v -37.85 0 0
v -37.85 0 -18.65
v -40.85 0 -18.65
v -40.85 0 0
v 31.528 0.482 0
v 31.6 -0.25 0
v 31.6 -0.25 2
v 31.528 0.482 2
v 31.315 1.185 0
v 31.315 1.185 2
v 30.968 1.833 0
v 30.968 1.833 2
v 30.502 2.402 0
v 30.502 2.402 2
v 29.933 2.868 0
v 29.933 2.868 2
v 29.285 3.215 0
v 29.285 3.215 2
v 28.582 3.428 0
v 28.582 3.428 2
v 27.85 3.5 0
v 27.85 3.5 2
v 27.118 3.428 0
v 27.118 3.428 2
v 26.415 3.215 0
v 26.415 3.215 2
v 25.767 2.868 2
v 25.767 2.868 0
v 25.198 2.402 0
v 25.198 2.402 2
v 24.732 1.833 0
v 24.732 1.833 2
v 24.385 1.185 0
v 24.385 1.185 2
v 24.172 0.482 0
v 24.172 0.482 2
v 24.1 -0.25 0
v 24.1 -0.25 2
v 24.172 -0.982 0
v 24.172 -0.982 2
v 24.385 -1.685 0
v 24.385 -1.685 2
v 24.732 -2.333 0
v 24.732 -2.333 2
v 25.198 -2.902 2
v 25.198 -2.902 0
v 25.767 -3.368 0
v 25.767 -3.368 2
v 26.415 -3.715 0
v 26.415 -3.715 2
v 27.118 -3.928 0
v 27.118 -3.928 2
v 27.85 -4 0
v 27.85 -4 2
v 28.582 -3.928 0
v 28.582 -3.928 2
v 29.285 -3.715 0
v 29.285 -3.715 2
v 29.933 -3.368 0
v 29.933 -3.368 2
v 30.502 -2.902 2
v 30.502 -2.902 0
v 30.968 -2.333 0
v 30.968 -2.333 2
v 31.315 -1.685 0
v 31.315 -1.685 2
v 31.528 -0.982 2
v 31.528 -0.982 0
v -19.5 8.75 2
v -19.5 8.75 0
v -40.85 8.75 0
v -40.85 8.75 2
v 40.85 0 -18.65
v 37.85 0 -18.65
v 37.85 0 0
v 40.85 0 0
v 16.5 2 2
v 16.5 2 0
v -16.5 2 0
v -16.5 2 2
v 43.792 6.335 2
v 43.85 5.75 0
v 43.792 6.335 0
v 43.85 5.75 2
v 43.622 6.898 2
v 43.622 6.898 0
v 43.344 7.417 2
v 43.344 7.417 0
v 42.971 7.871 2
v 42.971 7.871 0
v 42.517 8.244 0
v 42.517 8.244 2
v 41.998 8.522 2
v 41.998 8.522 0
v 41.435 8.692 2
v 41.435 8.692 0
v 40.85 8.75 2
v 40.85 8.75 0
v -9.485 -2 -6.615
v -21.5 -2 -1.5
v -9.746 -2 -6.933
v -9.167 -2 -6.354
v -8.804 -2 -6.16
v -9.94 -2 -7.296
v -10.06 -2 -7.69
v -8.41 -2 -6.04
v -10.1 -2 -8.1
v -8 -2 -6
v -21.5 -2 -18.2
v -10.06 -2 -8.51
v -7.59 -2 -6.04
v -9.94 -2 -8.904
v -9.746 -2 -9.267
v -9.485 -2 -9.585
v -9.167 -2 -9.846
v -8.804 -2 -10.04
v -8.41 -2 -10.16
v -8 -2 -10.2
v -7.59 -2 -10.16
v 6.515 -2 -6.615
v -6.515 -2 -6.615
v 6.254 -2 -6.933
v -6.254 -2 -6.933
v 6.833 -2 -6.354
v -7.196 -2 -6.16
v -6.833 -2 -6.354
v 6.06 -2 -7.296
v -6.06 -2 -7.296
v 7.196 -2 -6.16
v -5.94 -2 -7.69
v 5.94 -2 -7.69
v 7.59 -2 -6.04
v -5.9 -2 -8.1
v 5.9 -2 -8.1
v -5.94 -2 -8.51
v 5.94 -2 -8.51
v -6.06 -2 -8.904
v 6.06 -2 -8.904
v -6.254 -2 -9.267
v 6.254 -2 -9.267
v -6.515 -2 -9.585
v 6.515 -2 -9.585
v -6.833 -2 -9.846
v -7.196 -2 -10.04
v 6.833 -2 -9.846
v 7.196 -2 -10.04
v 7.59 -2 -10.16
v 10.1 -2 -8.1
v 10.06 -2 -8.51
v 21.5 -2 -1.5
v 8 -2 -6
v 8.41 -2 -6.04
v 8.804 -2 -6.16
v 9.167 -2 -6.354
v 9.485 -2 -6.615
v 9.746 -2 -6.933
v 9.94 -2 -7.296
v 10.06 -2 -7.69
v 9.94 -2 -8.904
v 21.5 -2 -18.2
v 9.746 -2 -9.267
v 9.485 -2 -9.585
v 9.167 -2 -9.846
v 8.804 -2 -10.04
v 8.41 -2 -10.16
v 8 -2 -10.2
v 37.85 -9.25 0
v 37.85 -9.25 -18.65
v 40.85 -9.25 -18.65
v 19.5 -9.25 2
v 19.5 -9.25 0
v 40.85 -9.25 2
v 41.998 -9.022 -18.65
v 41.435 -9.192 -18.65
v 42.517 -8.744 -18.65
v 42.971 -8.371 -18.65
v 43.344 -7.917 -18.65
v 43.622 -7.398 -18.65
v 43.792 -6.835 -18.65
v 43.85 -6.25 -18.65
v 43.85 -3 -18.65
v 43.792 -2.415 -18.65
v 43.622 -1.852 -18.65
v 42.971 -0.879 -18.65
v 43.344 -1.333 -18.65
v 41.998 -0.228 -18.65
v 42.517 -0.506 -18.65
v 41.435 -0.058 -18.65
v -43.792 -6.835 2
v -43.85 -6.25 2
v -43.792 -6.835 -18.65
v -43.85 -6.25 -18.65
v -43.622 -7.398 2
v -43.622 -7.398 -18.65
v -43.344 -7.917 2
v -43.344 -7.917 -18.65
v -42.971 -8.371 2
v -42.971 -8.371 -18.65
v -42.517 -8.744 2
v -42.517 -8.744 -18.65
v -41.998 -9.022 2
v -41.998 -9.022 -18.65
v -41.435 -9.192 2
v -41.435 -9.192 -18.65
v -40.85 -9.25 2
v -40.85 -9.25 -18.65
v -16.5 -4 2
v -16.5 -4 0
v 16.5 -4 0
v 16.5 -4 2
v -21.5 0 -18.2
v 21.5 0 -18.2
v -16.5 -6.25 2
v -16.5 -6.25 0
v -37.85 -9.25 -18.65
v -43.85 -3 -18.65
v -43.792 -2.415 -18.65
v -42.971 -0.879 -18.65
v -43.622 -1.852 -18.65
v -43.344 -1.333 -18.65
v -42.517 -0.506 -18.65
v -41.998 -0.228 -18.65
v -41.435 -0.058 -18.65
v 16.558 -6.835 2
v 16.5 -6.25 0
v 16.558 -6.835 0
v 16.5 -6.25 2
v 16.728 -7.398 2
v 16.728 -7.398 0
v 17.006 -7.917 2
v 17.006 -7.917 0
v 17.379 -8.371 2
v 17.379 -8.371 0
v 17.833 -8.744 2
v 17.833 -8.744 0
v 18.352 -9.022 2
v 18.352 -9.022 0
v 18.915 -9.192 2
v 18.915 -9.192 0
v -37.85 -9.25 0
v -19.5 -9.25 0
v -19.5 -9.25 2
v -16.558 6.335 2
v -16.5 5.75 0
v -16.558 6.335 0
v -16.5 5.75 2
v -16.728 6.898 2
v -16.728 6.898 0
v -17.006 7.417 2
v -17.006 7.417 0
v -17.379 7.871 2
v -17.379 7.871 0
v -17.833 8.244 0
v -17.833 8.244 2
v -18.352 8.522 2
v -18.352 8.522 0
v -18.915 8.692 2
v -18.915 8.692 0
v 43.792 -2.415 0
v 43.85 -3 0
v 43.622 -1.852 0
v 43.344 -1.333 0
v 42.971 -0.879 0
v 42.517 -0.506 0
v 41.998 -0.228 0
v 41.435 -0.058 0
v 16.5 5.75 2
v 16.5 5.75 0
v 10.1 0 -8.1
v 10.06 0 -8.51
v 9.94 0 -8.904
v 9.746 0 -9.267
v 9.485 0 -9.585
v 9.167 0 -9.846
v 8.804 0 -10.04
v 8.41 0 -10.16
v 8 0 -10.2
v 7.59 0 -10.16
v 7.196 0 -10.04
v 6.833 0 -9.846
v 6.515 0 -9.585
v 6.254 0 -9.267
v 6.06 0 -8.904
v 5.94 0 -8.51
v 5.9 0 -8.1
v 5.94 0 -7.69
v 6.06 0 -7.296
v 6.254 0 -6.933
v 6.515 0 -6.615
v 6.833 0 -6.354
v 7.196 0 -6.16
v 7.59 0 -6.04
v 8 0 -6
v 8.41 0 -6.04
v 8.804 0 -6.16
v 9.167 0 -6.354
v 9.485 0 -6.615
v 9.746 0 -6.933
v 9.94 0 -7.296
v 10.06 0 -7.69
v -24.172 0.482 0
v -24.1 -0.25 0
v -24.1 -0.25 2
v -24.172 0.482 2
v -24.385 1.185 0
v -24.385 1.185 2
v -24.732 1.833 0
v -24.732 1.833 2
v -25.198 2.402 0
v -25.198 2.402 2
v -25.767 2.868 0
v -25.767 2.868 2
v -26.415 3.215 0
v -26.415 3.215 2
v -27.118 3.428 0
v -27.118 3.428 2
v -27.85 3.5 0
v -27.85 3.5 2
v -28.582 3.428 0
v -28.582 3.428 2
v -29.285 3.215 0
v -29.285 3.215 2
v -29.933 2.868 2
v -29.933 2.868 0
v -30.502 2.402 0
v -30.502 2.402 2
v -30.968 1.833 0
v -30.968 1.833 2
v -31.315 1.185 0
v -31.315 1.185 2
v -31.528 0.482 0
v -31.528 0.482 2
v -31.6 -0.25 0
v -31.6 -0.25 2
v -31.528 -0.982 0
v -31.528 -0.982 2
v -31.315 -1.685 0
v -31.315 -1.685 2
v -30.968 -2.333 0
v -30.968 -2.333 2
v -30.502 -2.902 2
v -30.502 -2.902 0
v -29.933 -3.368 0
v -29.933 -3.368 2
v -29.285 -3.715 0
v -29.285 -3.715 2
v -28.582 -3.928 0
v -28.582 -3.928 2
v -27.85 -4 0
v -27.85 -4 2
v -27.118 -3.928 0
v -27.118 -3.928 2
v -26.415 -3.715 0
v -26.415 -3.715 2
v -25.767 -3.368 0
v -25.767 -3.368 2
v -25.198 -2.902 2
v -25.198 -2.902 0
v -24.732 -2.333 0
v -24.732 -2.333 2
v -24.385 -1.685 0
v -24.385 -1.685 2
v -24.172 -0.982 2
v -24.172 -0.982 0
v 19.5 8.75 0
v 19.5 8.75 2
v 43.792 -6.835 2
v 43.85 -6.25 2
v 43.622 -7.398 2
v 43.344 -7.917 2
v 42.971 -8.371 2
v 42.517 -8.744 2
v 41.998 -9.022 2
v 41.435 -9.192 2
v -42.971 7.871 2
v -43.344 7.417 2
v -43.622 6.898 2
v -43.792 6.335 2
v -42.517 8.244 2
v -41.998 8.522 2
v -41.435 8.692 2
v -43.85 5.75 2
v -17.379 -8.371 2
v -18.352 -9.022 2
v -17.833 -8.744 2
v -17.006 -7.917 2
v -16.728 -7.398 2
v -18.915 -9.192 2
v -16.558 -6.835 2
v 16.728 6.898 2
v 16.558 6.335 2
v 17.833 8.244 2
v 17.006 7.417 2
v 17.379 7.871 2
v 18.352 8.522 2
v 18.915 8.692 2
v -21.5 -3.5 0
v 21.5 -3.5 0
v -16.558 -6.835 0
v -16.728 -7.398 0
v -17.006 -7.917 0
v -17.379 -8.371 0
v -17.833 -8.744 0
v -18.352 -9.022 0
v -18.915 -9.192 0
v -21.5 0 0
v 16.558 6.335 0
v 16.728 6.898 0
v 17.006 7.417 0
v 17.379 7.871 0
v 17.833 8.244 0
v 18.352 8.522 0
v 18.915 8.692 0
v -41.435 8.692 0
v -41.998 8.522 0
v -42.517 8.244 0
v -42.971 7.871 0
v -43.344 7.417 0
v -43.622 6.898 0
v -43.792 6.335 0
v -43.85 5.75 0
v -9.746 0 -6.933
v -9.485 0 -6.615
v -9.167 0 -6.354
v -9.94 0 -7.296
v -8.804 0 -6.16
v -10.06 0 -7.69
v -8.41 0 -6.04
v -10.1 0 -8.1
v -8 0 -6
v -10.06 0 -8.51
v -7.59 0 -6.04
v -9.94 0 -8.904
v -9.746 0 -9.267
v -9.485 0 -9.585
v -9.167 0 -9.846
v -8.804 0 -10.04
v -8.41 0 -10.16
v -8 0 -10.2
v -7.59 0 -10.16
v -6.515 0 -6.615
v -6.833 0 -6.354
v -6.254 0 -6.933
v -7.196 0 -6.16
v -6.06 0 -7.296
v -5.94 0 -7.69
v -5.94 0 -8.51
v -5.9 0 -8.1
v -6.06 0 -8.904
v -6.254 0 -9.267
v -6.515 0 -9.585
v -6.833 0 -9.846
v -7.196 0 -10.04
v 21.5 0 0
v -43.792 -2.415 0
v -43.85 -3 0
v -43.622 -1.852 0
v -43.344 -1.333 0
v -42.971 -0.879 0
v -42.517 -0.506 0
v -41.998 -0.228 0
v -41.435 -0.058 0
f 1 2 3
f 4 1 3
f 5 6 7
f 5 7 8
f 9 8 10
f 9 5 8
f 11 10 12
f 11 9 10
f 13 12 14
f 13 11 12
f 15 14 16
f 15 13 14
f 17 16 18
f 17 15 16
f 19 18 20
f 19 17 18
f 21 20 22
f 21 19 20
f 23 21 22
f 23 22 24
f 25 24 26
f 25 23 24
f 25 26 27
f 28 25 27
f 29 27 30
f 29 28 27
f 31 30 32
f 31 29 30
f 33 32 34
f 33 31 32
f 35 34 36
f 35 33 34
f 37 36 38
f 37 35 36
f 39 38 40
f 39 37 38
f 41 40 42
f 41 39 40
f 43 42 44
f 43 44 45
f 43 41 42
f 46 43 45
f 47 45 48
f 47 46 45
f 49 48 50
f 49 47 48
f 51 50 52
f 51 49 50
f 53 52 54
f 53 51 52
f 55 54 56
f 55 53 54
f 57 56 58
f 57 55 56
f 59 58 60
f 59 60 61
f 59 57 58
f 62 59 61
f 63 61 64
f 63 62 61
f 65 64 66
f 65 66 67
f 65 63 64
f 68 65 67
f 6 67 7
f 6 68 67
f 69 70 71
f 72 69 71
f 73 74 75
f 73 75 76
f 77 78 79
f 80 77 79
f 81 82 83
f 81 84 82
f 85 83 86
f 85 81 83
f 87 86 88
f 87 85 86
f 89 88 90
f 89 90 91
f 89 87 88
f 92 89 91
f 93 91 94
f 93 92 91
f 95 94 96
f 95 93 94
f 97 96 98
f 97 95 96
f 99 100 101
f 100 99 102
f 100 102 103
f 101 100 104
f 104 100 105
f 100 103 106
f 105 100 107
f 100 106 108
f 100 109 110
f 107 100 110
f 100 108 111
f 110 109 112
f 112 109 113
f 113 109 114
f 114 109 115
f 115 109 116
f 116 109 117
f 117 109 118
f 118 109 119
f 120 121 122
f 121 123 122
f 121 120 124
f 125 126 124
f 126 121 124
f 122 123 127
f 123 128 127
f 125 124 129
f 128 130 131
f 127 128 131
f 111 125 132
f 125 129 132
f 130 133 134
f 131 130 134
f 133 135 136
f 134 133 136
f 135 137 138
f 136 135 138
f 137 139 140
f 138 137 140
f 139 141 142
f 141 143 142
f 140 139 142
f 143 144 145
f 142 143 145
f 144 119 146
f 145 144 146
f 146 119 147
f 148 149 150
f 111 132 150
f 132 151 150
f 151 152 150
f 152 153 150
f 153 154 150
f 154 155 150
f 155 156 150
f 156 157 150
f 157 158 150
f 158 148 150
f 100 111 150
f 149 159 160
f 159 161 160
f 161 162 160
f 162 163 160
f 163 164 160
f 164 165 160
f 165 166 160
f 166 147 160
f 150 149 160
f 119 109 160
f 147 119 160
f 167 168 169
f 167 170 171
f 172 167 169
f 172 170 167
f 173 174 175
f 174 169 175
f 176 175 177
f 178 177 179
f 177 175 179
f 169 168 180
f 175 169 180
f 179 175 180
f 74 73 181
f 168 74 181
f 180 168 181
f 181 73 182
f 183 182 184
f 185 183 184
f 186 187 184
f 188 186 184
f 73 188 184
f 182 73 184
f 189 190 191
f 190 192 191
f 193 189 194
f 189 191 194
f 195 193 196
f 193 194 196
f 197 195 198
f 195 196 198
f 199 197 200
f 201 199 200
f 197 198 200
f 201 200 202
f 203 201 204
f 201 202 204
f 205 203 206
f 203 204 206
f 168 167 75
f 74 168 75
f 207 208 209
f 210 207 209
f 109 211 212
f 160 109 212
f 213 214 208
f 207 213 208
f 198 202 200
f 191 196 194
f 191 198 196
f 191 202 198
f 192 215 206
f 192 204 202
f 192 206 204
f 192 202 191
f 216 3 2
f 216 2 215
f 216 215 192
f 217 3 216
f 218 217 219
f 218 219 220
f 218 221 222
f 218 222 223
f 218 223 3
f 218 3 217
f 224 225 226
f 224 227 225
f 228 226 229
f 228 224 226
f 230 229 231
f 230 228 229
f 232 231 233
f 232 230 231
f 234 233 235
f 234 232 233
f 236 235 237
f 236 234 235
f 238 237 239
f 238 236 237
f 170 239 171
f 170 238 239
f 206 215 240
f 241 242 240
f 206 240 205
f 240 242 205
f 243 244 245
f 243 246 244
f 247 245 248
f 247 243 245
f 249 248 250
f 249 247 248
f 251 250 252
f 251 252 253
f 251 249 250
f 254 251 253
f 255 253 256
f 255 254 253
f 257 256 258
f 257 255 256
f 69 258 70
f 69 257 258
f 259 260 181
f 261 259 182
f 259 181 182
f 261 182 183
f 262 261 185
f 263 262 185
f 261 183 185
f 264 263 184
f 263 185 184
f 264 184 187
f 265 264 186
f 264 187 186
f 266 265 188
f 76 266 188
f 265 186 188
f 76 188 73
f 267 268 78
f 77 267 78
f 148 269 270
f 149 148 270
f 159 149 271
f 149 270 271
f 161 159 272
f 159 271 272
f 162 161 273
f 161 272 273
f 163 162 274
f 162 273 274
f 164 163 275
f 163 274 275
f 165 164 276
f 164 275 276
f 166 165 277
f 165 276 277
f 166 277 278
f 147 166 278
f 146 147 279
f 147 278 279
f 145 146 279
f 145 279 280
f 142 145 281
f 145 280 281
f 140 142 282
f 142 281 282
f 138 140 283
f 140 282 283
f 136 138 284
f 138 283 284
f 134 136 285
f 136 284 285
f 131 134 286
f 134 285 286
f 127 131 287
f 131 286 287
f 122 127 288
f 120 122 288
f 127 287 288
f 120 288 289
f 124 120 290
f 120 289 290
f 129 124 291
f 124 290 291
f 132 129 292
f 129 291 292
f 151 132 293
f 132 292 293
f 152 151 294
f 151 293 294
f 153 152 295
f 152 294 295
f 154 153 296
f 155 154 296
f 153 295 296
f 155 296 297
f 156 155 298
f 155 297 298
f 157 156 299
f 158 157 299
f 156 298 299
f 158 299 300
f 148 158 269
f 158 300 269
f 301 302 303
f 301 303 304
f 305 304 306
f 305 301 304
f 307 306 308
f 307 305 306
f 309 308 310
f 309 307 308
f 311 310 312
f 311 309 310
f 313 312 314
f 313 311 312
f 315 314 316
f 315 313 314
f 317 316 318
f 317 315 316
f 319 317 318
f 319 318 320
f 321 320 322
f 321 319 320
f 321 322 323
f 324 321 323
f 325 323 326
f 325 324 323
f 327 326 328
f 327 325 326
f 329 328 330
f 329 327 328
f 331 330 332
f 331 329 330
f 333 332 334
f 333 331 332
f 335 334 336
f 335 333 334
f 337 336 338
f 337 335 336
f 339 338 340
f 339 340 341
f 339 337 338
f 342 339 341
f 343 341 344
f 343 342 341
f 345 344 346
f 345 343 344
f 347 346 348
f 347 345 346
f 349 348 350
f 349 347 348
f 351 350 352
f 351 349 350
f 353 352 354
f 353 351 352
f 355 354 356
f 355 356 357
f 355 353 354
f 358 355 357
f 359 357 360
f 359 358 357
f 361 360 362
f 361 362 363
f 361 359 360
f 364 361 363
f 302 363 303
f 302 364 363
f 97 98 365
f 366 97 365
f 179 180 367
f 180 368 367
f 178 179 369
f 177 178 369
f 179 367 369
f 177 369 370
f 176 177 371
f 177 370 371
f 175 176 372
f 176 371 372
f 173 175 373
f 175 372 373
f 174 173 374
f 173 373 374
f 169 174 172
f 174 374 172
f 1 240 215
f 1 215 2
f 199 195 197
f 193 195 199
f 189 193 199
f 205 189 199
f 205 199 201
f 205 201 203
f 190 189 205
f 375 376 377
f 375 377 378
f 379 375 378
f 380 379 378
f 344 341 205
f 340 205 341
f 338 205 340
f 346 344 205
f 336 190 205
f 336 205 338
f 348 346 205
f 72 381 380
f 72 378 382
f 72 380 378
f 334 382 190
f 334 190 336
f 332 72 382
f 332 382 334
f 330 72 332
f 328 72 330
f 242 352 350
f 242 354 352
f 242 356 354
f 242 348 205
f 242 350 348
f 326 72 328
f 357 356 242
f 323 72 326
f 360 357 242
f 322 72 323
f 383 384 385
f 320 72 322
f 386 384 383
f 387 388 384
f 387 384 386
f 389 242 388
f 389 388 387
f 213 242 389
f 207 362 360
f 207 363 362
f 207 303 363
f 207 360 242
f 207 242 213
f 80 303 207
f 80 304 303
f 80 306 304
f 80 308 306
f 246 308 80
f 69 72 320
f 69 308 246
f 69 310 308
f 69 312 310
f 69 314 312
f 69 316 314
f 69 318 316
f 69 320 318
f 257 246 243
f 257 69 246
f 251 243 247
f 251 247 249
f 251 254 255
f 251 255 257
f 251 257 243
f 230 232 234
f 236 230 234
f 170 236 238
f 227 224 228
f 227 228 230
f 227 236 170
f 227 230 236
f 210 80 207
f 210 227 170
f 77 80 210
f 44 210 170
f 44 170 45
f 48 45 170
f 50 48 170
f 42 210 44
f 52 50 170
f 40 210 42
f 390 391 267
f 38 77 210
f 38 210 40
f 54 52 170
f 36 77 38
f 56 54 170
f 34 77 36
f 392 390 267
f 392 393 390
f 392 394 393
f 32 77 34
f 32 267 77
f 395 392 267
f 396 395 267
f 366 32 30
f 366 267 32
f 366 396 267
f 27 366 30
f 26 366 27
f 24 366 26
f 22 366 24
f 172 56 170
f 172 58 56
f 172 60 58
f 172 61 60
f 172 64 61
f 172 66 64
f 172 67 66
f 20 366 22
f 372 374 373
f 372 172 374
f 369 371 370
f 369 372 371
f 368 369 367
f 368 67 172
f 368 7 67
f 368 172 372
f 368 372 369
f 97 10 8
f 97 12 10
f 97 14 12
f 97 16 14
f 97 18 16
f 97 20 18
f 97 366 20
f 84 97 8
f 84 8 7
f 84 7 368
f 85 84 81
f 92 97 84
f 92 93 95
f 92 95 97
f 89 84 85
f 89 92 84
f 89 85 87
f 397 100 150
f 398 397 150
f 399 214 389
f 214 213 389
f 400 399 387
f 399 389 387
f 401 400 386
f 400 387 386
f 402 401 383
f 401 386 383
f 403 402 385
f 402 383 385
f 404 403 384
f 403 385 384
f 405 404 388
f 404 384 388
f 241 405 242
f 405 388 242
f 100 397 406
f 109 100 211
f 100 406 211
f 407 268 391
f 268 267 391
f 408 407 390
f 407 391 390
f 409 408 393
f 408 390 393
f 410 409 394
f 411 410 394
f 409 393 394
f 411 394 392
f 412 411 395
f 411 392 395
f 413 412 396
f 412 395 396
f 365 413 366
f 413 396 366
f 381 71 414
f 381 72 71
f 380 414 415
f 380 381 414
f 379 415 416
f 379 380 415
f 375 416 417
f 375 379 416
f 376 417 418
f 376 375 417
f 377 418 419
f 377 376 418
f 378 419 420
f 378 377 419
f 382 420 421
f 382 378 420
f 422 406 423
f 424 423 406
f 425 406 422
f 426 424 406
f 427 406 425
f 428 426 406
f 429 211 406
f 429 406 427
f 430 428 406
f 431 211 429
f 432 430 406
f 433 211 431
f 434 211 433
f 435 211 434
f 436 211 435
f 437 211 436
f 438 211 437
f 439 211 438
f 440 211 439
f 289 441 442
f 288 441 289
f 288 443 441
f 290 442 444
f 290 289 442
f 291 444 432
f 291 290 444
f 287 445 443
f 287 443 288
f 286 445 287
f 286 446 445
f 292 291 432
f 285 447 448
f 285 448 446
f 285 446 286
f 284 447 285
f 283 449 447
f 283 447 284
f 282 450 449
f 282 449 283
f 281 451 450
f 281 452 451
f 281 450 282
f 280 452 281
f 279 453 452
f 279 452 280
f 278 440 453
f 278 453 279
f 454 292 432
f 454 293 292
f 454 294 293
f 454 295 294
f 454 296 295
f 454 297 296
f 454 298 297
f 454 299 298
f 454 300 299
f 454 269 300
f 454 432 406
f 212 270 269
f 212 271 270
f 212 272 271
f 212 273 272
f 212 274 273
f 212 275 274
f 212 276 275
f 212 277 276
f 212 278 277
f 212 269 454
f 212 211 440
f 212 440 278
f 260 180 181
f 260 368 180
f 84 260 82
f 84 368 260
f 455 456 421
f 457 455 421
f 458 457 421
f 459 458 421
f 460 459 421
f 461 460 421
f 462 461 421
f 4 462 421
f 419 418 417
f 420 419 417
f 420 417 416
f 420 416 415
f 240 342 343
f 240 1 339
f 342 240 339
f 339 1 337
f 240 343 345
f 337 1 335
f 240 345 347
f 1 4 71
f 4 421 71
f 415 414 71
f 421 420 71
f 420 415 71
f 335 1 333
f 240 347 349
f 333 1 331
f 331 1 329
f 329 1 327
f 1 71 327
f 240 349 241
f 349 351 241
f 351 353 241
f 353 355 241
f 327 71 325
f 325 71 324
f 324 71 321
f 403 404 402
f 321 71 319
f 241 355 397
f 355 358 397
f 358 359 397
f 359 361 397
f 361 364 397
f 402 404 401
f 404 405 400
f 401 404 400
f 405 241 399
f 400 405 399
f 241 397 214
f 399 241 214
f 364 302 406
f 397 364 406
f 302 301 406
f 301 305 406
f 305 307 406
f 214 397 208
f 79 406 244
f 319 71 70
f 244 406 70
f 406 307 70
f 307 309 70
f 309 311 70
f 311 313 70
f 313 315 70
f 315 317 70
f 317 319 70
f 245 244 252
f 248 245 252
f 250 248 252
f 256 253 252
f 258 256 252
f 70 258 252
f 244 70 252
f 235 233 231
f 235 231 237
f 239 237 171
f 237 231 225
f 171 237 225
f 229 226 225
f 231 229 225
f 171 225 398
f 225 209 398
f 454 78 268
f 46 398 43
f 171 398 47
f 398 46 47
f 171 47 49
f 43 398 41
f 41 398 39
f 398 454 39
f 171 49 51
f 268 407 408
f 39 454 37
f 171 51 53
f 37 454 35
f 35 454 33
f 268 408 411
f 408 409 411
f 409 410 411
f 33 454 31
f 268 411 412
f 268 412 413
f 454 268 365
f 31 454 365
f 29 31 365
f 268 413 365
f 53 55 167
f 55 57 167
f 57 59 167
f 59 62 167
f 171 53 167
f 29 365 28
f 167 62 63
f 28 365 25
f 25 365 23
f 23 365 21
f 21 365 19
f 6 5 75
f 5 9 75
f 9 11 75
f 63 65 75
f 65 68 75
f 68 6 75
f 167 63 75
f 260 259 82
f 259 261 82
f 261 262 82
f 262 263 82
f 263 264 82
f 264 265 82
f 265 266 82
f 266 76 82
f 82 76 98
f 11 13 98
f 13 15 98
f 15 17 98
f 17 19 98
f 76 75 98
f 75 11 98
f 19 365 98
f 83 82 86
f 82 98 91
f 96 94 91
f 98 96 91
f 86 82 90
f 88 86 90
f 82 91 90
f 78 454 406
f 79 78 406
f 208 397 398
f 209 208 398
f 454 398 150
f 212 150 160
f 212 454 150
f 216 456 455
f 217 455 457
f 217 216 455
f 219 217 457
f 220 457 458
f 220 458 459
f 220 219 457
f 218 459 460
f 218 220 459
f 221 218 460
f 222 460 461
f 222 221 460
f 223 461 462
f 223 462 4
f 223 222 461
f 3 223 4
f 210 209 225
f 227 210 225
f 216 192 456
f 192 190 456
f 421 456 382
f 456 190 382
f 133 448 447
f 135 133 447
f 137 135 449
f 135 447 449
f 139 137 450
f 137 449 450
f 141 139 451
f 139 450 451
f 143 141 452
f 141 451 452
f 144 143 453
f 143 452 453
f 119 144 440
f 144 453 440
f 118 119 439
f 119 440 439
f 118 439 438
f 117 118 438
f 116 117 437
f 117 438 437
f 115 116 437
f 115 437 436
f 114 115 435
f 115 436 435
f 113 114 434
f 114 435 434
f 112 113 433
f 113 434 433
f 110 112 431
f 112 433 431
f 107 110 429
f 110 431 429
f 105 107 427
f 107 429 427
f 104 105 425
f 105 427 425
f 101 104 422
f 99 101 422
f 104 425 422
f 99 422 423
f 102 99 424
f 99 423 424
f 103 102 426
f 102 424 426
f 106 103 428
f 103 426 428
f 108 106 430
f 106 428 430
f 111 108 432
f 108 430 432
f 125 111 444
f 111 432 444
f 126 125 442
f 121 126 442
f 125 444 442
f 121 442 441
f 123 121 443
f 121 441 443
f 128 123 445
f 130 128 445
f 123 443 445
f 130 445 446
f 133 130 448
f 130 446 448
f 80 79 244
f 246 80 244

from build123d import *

# Parameters (mm, degrees)
SKETCH3_W           = 43
SKETCH3_H           = 18.2
SKETCH3_R           = 2.1
BOSS_EXTRUDE5_DEPTH = 2
SKETCH1_R           = 3.75
BOSS_EXTRUDE1_DEPTH = 2
CHAMFER1_SIZE       = 1.5
SKETCH5_W           = 6
SKETCH5_H           = 9.25
BOSS_EXTRUDE4_DEPTH = 18.65
FILLET1_R           = 3


with BuildPart() as part:
    # Sketch3 → Boss-Extrude5 (new body)
    with BuildSketch(Plane(origin=(0, 0, 0), x_dir=(1, 0, 0), z_dir=(0, 1, 0))):
        with Locations((0, 9.1)):
            Rectangle(SKETCH3_W, SKETCH3_H)
        with Locations((-8, 8.1)):
            Circle(SKETCH3_R, mode=Mode.SUBTRACT)
        with Locations((8, 8.1)):
            Circle(SKETCH3_R, mode=Mode.SUBTRACT)
    extrude(amount=-BOSS_EXTRUDE5_DEPTH)

    # Sketch1 → Boss-Extrude1 (add)
    with BuildSketch(Plane.XY):
        Polygon((-43.85, -9.25), (-16.5, -9.25), (-16.5, -4), (16.5, -4), (16.5, -9.25), (43.85, -9.25), (43.85, 8.75), (16.5, 8.75), (16.5, 2), (-16.5, 2), (-16.5, 8.75), (-43.85, 8.75), align=None)
        with Locations((-27.85, -0.25)):
            Circle(SKETCH1_R, mode=Mode.SUBTRACT)
        with Locations((27.85, -0.25)):
            Circle(SKETCH1_R, mode=Mode.SUBTRACT)
    extrude(amount=BOSS_EXTRUDE1_DEPTH)

    # Chamfer1
    chamfer1_edges = [part.edges().sort_by_distance(p)[0] for p in [
        (0, -2, 0),
    ]]
    chamfer(chamfer1_edges, length=CHAMFER1_SIZE)

    # Sketch5 → Boss-Extrude4 (add)
    with BuildSketch(Plane(origin=(0, 0, 0), x_dir=(-1, 0, 0), z_dir=(0, 0, -1))):
        with Locations((40.85, -4.625)):
            Rectangle(SKETCH5_W, SKETCH5_H)
    boss_extrude4 = extrude(amount=BOSS_EXTRUDE4_DEPTH)

    # Mirror2: Boss-Extrude4 across plane
    add(boss_extrude4.mirror(Plane(origin=(0, 0, 0), x_dir=(0, 0, 1), z_dir=(1, 0, 0))))

    # Fillet1
    fillet1_edges = [part.edges().sort_by_distance(p)[0] for p in [
        (-43.85, 8.75, 1),
        (-43.85, -9.25, -8.325),
        (-16.5, -9.25, 1),
        (16.5, -9.25, 1),
        (43.85, -9.25, -8.325),
        (43.85, 8.75, 1),
        (16.5, 8.75, 1),
        (-16.5, 8.75, 1),
        (-43.85, 0, -9.325),
        (43.85, 0, -9.325),
    ]]
    fillet(fillet1_edges, radius=FILLET1_R)


solid = part.part
